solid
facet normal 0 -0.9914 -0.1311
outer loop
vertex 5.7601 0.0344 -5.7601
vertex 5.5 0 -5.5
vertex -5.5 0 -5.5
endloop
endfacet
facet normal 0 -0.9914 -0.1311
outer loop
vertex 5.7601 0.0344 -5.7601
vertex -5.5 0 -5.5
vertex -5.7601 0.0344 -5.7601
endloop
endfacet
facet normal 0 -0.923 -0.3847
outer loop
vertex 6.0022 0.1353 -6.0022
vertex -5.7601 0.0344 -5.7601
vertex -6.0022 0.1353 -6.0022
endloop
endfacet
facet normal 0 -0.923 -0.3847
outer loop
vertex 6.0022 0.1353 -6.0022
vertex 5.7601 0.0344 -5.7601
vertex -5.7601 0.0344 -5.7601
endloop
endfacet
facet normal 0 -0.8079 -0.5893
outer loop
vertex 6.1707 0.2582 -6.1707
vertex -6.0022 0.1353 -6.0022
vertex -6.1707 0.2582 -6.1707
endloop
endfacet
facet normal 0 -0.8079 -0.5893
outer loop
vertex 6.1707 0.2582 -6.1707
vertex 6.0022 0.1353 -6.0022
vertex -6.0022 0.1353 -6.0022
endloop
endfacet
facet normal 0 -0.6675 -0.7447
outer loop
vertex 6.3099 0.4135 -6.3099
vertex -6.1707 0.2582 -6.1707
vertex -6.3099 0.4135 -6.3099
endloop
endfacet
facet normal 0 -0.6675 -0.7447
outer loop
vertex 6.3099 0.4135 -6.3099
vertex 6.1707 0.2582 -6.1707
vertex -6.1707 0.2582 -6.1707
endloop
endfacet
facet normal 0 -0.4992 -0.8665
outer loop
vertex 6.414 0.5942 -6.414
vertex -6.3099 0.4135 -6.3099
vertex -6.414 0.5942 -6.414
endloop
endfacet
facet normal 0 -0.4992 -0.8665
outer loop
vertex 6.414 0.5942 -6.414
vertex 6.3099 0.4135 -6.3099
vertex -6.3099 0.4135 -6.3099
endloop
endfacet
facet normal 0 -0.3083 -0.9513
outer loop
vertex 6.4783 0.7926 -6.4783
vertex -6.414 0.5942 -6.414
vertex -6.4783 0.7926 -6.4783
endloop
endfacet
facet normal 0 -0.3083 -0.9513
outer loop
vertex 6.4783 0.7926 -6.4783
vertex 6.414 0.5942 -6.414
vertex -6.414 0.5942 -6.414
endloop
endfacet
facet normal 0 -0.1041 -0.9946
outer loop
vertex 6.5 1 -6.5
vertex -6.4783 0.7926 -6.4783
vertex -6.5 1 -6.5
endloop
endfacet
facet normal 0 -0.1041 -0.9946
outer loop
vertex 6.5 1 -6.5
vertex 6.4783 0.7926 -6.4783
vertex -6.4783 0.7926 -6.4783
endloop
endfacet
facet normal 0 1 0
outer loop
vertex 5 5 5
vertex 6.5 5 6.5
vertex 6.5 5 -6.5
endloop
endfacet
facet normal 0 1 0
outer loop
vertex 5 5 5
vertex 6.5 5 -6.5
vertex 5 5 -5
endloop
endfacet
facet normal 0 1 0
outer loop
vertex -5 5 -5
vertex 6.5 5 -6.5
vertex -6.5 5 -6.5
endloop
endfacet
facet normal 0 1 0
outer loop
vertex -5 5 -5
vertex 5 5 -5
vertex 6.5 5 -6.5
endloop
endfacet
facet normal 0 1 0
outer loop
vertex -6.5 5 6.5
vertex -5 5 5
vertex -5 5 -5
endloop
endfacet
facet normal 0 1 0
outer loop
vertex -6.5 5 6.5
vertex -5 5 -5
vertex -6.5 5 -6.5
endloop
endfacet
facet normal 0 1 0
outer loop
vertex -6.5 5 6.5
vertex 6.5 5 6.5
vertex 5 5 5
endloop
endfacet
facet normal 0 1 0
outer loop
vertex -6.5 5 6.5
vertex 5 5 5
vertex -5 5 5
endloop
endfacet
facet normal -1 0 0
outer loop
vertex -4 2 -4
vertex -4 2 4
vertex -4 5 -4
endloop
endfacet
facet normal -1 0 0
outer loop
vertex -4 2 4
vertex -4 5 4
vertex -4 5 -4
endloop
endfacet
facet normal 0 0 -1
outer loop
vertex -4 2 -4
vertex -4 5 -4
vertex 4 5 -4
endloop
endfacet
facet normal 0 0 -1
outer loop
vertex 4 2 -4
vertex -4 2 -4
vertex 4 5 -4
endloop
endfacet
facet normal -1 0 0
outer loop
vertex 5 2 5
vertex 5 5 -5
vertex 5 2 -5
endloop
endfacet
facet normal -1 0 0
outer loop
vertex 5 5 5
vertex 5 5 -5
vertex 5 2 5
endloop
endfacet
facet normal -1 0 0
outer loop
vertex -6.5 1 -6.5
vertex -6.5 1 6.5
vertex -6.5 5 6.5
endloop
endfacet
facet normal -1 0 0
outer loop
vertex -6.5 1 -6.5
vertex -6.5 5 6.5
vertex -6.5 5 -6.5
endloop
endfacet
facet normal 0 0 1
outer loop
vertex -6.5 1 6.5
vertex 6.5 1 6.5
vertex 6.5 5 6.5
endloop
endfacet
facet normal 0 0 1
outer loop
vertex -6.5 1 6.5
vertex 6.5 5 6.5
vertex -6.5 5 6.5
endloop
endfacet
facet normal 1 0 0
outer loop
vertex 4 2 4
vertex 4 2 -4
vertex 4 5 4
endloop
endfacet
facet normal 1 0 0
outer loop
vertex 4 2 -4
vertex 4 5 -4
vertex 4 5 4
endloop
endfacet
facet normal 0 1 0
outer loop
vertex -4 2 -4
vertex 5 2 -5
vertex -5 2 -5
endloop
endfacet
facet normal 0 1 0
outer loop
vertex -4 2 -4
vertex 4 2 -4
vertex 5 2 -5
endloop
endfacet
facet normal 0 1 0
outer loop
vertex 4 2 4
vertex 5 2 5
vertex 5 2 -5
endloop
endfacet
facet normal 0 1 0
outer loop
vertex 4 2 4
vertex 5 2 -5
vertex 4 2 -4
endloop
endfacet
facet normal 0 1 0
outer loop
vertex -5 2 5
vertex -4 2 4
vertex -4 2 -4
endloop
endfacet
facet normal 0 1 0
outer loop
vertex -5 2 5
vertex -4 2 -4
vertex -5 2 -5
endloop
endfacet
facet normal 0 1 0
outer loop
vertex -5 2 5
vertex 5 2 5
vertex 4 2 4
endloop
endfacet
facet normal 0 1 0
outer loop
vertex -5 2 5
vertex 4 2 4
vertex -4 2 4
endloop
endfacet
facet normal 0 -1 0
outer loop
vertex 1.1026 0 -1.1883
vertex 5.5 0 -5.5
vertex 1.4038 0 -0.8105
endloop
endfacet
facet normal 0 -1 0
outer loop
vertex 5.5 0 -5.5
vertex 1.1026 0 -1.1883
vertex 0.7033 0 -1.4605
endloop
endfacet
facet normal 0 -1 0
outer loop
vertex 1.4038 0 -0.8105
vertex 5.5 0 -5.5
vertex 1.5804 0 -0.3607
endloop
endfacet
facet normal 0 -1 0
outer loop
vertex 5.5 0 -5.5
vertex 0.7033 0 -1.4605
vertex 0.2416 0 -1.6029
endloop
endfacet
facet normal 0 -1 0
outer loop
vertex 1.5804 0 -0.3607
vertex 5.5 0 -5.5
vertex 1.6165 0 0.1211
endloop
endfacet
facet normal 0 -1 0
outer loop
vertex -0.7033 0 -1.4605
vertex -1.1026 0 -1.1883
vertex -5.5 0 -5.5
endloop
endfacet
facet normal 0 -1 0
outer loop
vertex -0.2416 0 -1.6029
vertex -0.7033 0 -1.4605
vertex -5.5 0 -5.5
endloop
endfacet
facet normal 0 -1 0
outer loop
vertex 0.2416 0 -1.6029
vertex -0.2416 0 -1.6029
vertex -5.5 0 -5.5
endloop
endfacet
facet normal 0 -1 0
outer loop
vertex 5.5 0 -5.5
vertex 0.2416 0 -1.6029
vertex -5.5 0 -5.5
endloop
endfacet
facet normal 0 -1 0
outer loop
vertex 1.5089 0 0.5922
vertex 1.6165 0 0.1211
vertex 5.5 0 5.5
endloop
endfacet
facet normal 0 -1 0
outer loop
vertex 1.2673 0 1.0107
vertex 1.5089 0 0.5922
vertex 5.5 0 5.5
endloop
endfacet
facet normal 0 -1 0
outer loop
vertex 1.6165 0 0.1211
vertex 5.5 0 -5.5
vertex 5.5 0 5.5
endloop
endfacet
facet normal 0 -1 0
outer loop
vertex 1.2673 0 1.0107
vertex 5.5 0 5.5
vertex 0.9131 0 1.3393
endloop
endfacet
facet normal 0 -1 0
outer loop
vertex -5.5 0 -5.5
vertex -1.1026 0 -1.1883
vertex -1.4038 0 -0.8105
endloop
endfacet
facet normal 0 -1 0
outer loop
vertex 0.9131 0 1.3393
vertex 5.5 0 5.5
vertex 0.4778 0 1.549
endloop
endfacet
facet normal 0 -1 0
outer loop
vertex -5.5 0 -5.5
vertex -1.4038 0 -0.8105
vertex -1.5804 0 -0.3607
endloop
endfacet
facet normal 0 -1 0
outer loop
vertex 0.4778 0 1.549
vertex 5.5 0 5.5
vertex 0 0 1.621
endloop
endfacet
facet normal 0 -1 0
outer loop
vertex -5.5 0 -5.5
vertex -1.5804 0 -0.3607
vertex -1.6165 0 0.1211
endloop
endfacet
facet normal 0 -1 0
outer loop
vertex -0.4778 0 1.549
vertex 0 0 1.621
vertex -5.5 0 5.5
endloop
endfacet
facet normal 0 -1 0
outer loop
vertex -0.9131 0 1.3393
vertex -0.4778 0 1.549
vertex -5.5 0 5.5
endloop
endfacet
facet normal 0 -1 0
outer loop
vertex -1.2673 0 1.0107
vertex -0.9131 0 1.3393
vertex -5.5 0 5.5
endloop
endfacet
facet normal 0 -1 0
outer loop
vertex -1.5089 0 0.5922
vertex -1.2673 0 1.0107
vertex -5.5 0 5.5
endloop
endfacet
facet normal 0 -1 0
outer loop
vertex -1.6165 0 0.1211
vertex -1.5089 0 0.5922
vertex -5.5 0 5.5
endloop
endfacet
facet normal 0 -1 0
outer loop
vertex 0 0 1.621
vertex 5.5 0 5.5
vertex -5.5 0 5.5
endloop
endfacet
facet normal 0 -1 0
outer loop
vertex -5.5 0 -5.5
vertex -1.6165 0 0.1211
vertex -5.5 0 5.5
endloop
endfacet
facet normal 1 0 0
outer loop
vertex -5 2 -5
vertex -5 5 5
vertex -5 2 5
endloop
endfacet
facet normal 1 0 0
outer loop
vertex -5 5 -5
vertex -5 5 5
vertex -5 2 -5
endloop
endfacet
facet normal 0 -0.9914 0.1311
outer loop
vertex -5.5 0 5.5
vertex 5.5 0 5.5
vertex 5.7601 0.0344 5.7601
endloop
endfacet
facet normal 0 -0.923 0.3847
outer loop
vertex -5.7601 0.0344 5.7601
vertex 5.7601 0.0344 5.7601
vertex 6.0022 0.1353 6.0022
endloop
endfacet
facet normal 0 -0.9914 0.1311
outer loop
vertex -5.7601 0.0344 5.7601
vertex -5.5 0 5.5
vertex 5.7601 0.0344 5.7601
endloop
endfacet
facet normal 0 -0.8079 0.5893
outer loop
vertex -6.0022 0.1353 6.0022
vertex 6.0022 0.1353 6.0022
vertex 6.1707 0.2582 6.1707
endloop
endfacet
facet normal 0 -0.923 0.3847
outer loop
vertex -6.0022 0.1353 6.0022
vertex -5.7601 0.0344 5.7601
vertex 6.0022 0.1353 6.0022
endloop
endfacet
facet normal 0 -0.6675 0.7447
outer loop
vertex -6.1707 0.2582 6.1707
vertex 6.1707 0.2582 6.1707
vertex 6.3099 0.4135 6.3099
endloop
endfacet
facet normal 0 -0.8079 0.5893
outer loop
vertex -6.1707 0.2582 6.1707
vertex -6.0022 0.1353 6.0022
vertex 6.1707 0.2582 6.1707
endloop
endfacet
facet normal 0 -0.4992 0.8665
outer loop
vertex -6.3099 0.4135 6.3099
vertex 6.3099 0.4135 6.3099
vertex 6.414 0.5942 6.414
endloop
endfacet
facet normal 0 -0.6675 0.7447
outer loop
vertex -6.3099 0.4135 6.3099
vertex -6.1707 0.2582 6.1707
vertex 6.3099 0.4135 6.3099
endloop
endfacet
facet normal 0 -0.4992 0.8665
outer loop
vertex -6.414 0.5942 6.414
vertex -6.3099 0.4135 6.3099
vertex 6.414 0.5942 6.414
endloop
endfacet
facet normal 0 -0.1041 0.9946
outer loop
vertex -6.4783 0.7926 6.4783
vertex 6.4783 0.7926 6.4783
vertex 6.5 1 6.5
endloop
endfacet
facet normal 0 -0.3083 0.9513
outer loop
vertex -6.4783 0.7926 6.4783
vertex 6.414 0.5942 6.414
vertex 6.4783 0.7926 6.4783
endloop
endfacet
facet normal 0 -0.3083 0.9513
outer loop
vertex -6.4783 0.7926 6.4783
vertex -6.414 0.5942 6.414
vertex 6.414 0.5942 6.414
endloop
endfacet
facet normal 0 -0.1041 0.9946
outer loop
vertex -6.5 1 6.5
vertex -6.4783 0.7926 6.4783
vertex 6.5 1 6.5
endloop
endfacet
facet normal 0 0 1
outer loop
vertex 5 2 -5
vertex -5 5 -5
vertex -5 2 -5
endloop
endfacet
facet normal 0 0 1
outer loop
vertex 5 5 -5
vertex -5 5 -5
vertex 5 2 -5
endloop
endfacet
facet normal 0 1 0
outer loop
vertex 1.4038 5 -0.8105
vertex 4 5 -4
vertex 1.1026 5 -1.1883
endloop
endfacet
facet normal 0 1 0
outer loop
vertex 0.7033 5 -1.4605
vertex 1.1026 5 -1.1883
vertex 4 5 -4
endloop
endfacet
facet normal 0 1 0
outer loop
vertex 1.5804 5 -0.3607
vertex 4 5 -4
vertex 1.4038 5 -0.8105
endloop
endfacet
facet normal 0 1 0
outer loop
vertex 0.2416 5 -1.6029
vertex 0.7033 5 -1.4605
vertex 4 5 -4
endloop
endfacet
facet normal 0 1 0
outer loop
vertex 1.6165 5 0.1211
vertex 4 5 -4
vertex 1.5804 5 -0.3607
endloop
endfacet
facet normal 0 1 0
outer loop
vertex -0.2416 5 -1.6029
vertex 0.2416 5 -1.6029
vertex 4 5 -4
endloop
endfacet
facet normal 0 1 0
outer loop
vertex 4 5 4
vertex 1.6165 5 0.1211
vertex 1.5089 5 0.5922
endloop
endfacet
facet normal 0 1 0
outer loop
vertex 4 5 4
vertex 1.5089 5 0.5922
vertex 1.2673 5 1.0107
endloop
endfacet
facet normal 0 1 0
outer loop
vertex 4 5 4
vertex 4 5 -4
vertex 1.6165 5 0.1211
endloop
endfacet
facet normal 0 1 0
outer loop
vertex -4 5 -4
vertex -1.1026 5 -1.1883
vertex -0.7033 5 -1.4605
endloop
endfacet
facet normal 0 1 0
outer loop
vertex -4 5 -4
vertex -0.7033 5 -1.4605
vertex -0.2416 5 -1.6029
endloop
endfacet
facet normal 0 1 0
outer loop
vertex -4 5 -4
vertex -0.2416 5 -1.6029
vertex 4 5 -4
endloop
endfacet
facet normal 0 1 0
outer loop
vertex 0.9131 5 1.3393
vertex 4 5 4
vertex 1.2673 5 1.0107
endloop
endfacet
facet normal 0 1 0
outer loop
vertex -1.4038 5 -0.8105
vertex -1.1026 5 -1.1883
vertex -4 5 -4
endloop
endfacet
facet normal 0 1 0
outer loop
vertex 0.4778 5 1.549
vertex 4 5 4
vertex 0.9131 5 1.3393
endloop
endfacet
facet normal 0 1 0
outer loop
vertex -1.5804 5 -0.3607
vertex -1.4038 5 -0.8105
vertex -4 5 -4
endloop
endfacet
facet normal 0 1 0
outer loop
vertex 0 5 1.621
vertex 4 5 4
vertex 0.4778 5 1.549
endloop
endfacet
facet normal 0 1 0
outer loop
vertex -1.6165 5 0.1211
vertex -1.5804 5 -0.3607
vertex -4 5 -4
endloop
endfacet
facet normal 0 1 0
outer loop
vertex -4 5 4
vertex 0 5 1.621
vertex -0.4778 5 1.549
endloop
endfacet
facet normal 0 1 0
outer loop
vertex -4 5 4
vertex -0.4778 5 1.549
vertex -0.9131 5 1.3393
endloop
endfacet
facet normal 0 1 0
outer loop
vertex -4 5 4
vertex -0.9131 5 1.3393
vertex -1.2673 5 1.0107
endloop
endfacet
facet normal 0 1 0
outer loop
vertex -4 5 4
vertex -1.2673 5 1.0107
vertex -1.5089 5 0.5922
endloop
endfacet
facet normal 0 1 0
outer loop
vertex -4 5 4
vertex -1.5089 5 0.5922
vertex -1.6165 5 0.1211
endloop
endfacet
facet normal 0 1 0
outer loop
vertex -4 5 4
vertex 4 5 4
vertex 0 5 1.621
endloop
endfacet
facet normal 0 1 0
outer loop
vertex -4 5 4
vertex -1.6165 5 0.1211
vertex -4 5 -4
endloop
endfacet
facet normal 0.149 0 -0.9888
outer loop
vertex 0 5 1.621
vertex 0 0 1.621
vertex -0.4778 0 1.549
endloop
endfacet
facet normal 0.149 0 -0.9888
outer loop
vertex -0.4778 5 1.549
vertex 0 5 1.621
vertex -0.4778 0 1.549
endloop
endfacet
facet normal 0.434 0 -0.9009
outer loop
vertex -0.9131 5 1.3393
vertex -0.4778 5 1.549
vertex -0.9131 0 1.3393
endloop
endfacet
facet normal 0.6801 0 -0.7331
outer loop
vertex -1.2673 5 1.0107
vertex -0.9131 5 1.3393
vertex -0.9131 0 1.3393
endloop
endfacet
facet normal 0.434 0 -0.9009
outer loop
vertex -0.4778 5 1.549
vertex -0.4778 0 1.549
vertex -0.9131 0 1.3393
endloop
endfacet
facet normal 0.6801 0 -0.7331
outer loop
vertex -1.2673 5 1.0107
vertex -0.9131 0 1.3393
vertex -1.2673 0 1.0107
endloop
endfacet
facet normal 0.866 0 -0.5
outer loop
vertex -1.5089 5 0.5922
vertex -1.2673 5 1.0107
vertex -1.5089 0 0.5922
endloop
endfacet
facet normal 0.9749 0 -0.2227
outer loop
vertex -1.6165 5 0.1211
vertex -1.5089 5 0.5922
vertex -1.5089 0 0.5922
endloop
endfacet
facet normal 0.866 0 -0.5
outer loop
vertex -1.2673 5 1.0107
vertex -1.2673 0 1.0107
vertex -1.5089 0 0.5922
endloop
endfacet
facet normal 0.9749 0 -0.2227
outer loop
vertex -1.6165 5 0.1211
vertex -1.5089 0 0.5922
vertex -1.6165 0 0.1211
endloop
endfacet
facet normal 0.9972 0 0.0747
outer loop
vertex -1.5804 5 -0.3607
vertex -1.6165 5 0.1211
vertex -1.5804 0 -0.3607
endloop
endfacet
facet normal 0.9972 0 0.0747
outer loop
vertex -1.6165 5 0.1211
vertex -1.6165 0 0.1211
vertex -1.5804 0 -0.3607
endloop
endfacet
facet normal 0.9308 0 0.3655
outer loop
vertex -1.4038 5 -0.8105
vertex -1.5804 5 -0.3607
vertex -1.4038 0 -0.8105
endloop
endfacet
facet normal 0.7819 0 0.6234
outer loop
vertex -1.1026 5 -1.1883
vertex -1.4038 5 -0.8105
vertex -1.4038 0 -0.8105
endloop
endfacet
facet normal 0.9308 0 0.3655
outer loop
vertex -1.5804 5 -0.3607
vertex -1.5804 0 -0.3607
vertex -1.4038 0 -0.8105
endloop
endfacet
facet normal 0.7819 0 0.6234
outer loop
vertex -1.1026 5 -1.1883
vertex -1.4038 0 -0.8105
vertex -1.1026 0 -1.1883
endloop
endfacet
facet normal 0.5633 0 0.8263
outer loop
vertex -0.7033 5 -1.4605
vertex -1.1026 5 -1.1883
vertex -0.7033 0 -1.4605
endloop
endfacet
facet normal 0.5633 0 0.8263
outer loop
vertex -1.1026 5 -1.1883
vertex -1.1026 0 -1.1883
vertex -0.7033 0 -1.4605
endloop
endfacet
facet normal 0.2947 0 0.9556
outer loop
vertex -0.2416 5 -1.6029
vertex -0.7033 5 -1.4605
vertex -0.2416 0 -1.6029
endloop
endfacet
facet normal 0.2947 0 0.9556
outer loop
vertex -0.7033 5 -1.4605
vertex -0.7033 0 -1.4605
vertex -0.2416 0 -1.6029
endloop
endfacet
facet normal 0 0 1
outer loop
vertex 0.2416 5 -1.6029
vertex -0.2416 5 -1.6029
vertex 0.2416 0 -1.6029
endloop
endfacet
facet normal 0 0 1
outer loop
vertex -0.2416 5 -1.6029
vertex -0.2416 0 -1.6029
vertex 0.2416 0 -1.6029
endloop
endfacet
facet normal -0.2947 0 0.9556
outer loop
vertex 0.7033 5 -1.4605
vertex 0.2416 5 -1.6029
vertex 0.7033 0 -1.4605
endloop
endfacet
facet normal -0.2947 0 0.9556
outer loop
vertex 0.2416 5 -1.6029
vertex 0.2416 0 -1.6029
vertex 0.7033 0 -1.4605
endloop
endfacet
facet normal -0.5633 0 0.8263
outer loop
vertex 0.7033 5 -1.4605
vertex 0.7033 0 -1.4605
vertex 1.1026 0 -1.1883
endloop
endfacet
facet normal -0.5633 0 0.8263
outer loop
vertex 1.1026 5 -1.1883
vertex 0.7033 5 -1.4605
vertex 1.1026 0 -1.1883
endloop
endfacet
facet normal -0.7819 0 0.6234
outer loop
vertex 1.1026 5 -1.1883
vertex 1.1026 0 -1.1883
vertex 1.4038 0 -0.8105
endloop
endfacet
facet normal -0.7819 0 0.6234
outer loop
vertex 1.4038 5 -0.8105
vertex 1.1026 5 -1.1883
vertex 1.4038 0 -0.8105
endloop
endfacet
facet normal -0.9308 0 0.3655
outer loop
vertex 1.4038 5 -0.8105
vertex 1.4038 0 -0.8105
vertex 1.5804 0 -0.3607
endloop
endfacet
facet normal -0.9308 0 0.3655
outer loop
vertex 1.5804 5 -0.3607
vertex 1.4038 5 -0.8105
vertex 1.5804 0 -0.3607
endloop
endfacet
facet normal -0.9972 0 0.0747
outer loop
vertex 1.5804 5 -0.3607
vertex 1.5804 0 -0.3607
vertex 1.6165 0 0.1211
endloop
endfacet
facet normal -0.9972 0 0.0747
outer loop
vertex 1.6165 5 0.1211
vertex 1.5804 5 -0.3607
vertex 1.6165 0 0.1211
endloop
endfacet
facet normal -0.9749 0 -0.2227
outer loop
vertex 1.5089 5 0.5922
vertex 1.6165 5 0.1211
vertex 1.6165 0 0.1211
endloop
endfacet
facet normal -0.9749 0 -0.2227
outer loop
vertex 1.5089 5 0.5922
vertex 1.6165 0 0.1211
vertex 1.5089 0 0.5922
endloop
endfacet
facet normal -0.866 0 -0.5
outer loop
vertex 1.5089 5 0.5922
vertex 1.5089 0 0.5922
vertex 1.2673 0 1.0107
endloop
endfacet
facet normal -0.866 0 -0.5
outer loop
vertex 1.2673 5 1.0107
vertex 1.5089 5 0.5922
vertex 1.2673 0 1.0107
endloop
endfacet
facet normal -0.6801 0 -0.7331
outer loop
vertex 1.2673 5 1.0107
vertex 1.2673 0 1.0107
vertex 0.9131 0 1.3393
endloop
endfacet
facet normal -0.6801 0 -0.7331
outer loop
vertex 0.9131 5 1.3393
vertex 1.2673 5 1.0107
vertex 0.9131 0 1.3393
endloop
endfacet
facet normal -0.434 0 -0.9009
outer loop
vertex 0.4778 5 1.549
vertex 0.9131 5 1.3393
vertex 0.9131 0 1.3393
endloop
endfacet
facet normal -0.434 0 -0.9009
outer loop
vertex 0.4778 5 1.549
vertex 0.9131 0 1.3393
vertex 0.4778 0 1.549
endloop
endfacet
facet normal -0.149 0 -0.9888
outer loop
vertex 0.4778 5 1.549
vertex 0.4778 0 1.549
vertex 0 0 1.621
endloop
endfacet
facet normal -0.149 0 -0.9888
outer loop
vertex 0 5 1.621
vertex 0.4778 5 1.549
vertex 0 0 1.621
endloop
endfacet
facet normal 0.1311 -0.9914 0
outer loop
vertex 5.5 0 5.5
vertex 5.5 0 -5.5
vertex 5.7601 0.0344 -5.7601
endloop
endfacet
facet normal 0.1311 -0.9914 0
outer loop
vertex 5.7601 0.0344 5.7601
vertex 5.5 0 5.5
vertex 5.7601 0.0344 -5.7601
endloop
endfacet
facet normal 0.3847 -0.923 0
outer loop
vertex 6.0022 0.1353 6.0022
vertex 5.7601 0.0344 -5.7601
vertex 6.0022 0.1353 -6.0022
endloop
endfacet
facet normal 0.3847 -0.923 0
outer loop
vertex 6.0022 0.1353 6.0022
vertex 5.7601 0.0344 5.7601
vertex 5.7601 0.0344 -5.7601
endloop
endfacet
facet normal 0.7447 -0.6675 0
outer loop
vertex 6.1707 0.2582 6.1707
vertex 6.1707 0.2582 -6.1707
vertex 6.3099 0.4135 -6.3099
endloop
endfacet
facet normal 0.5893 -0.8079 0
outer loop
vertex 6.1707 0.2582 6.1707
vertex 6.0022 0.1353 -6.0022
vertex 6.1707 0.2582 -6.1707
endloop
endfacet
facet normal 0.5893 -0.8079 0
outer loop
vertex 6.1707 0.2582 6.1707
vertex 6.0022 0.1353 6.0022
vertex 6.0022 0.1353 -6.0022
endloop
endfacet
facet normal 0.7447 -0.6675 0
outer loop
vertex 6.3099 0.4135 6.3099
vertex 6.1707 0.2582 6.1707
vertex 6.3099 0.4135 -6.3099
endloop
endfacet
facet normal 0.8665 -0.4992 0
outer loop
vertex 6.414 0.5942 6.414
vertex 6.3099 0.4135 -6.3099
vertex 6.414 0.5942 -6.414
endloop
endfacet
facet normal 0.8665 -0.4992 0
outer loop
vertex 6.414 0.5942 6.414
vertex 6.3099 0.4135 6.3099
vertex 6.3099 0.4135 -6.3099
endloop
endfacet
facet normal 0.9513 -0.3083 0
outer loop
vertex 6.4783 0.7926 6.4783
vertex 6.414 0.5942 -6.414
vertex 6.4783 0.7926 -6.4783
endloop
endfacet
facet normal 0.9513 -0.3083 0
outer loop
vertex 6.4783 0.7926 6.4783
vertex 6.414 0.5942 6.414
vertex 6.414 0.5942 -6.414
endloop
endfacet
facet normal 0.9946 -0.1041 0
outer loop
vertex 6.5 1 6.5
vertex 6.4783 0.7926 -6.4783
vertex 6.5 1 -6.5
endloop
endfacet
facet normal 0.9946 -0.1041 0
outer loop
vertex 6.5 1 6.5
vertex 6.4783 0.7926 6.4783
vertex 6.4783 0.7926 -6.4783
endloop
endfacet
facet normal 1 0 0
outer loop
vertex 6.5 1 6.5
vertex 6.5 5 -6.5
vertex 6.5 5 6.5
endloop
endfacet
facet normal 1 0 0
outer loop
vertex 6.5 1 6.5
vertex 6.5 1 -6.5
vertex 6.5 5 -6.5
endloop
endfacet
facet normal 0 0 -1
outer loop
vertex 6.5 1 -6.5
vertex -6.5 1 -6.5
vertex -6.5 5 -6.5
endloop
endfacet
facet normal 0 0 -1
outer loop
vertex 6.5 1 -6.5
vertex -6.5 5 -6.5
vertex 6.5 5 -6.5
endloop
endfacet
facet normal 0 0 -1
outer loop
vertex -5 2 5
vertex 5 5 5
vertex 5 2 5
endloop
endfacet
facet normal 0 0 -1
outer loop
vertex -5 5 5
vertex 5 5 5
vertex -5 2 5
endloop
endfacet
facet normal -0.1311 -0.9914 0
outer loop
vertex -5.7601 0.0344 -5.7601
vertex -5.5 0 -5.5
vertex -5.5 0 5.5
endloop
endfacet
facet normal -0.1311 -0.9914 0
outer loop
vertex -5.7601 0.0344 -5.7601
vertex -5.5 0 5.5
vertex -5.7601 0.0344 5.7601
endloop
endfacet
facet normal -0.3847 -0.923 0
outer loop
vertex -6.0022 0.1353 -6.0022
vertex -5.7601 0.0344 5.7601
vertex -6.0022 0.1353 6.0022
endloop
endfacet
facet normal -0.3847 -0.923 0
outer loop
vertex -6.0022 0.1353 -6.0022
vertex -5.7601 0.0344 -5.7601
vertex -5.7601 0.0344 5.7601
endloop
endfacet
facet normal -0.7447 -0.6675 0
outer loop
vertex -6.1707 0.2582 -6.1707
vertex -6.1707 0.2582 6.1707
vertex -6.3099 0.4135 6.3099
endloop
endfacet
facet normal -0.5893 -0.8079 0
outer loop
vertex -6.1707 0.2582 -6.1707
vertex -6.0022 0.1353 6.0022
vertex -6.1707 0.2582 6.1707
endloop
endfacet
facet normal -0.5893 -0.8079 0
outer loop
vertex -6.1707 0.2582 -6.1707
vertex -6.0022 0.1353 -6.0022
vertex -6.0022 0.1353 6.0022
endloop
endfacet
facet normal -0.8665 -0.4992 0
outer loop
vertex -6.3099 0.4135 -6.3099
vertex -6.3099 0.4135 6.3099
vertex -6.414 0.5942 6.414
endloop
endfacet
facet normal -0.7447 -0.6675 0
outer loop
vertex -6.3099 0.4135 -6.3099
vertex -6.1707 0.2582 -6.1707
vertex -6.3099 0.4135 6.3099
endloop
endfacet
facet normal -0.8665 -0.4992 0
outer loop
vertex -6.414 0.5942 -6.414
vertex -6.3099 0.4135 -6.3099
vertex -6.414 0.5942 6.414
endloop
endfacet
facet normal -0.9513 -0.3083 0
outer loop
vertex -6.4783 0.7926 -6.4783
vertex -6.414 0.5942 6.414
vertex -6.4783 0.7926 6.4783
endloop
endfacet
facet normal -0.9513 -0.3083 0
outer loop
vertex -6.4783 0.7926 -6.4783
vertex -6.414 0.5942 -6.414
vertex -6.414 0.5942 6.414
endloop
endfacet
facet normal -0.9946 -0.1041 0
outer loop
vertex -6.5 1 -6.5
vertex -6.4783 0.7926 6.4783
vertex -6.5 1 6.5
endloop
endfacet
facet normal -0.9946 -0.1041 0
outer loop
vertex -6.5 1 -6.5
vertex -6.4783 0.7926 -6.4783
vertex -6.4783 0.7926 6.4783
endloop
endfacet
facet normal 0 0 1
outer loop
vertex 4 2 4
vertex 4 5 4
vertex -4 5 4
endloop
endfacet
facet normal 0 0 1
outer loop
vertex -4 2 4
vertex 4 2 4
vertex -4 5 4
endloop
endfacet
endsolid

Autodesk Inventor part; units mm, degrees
ref_plane "YZ Plane" through (0, 0, 0) normal (1, 0, 0) x (0, 1, 0)
ref_plane "XY Plane" through (0, 0, 0) normal (0, 0, 1) x (1, 0, 0)
sketch "スケッチ1" plane through (0, 0, 0) normal (0, 1, 0) x (-1, 0, 0)
  line L0 (6.5, -6.5) -> (-6.5, -6.5)
  line L1 (-6.5, -6.5) -> (-6.5, 6.5)
  line L2 (-6.5, 6.5) -> (6.5, 6.5)
  line L3 (6.5, 6.5) -> (6.5, -6.5)
  line L4 (6.5, -6.5) -> (-6.5, 6.5) construction
  line L5 (-6.5, -6.5) -> (6.5, 6.5) construction
  dimension "d1" = 13
  dimension "d2" = 13
extrude "押し出し4" add sketch "スケッチ1" along normal blind 5
ref_plane "作業平面2" through (0, 5, 0) normal (0, 1, 0) x (-1, 0, 0)
sketch "スケッチ3" plane through (0, 5, 0) normal (0, 1, 0) x (-1, 0, 0)
  line L0 (4, -4) -> (-4, -4)
  line L1 (-4, -4) -> (-4, 4)
  line L2 (-4, 4) -> (4, 4)
  line L3 (4, 4) -> (4, -4)
  line L4 (4, -4) -> (-4, 4) construction
  line L5 (-4, -4) -> (4, 4) construction
  line L6 (5, -5) -> (-5, -5)
  line L7 (-5, -5) -> (-5, 5)
  line L8 (-5, 5) -> (5, 5)
  line L9 (5, 5) -> (5, -5)
  line L10 (5, -5) -> (-5, 5) construction
  line L11 (-5, -5) -> (5, 5) construction
  point P0 (0, 0)
  point P1 (0, 0)
  dimension "d19" = 8
  dimension "d20" = 8
  dimension "d21" = 10
  dimension "d22" = 10
extrude "押し出し5" cut sketch "スケッチ3" against normal blind 3
hole "穴1" at (0, 5, 0) direction (0, -1, 0) diameter 3.242 end through all thread size "M4x0.7" class "6H" standard "ANSI Metric M Profile"
fillet "フィレット1" radius 1 4 edges at (0, 0, -6.5) (6.5, 0, 0) (-6.5, 0, 0) (0, 0, 6.5)
sketch "スケッチ4" plane through (0, 5, 0) normal (0, 1, 0) x (1, 0, 0)
  point P0 (0, 0)
sketch "スケッチ5" plane through (0, 5, 0) normal (0, 1, 0) x (1, 0, 0)
  point P0 (0, 0)
properties part number "pin_joint_ver1"
